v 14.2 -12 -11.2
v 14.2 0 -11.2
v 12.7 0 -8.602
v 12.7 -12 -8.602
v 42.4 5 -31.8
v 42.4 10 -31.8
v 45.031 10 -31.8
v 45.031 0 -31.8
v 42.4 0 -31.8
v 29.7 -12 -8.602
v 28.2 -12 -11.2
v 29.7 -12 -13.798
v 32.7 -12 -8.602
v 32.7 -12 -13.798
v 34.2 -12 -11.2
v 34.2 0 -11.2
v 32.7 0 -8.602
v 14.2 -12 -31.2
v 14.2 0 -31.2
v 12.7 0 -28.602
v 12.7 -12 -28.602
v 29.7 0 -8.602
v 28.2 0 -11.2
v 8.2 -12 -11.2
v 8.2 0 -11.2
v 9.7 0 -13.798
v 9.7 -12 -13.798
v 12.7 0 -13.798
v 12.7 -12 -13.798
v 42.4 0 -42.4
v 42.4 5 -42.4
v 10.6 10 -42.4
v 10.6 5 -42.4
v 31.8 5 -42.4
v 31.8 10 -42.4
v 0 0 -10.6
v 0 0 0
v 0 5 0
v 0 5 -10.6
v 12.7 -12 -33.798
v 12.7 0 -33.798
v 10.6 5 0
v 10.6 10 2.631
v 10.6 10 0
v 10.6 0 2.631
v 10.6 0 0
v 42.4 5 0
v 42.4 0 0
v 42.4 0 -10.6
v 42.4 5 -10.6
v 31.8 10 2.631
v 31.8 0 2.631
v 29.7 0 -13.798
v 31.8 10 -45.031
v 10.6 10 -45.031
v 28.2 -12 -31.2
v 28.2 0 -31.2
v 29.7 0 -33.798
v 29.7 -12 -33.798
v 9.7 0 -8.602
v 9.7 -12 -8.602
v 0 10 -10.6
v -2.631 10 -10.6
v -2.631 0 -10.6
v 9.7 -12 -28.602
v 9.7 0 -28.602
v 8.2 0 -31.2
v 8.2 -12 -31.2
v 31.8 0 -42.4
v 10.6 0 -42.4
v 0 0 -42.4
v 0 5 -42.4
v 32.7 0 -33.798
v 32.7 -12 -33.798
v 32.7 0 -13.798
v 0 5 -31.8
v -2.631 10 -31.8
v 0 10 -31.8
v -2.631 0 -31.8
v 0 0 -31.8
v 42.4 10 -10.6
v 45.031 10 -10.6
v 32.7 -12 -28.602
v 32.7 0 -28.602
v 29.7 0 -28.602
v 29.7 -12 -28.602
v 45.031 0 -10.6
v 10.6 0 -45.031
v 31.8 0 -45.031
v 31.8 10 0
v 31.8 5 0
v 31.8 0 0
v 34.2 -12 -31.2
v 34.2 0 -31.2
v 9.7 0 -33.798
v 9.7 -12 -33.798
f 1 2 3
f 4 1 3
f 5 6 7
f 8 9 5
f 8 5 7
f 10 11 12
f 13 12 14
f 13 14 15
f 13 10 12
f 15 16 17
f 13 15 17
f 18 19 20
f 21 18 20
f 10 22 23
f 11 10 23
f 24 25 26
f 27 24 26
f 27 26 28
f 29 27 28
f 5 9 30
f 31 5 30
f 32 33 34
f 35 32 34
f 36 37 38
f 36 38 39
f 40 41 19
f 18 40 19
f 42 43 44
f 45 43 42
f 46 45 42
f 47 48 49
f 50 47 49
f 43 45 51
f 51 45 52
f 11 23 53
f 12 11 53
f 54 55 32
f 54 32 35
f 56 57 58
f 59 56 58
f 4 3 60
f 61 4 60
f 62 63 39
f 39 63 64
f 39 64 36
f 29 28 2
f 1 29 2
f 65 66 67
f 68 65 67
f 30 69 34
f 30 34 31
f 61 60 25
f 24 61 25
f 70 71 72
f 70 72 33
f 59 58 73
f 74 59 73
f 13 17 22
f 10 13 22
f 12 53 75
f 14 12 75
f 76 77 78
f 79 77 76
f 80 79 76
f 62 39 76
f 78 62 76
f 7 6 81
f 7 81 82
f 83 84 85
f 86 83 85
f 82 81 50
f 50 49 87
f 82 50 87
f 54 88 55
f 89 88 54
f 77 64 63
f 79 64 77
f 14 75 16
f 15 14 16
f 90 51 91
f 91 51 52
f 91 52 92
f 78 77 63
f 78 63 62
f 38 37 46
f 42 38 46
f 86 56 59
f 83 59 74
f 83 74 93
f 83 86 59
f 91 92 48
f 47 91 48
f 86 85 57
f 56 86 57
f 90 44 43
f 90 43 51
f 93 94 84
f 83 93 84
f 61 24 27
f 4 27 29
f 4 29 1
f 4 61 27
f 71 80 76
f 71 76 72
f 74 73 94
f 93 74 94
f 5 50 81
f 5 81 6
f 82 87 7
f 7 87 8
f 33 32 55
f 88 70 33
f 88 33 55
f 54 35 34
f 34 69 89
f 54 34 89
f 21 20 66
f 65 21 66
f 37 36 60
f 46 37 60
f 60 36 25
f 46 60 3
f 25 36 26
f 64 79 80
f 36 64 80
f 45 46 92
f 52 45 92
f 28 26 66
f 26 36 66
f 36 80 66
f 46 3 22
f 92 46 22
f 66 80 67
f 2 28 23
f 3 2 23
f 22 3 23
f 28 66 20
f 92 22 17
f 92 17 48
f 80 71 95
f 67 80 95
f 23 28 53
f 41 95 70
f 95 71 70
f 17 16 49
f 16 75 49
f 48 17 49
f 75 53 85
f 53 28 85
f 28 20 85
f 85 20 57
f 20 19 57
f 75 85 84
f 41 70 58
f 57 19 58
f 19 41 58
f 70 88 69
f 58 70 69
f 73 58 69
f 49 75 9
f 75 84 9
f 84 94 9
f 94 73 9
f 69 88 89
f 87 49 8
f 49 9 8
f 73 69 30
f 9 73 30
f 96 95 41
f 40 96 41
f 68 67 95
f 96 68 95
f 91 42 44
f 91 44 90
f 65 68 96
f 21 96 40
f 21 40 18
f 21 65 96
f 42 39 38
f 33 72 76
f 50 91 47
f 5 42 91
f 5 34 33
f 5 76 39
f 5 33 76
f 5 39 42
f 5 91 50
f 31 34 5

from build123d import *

# Parameters (mm, degrees)
SKETCH1_W                = 42.4
SKETCH1_H                = 42.4
BOSS_EXTRUDE1_DEPTH      = 5
BOSS_EXTRUDE2_DEPTH      = 5
BOSS_EXTRUDE2_DEPTH_BACK = 5
SKETCH3_W                = 2.630753666
SKETCH3_H                = 21.2
SKETCH3_W_2              = 21.2
SKETCH3_H_2              = 2.630753666
BOSS_EXTRUDE3_DEPTH      = 12


with BuildPart() as part:
    # Sketch1 → Boss-Extrude1 (new body)
    with BuildSketch(Plane(origin=(0, 0, 0), x_dir=(1, 0, 0), z_dir=(0, 1, 0))):
        with Locations((21.2, 21.2)):
            Rectangle(SKETCH1_W, SKETCH1_H)
    extrude(amount=BOSS_EXTRUDE1_DEPTH)

    # Sketch3 → Boss-Extrude2 (add, two sides: drawn at the far end of the back side and taken through both)
    with BuildSketch(Plane(origin=(0, 5, 0), x_dir=(1, 0, 0), z_dir=(0, 1, 0)).offset(-BOSS_EXTRUDE2_DEPTH_BACK)):
        with Locations((43.715376833, 21.2)):
            Rectangle(SKETCH3_W, SKETCH3_H)
        with Locations((21.2, 43.715376833)):
            Rectangle(SKETCH3_W_2, SKETCH3_H_2)
        with Locations((21.2, -1.315376833)):
            Rectangle(SKETCH3_W_2, SKETCH3_H_2)
        with Locations((-1.315376833, 21.2)):
            Rectangle(SKETCH3_W, SKETCH3_H)
    extrude(amount=BOSS_EXTRUDE2_DEPTH + BOSS_EXTRUDE2_DEPTH_BACK)

    # Sketch4 → Boss-Extrude3 (add)
    with BuildSketch(Plane.XZ):
        Polygon((32.7, -8.601923789), (29.7, -8.601923789), (28.2, -11.2), (29.7, -13.798076211), (32.7, -13.798076211), (34.2, -11.2), align=None)
        Polygon((9.7, -8.601923789), (8.2, -11.2), (9.7, -13.798076211), (12.7, -13.798076211), (14.2, -11.2), (12.7, -8.601923789), align=None)
        Polygon((32.7, -28.601923789), (29.7, -28.601923789), (28.2, -31.2), (29.7, -33.798076211), (32.7, -33.798076211), (34.2, -31.2), align=None)
        Polygon((12.7, -28.601923789), (9.7, -28.601923789), (8.2, -31.2), (9.7, -33.798076211), (12.7, -33.798076211), (14.2, -31.2), align=None)
    extrude(amount=BOSS_EXTRUDE3_DEPTH)


solid = part.part
